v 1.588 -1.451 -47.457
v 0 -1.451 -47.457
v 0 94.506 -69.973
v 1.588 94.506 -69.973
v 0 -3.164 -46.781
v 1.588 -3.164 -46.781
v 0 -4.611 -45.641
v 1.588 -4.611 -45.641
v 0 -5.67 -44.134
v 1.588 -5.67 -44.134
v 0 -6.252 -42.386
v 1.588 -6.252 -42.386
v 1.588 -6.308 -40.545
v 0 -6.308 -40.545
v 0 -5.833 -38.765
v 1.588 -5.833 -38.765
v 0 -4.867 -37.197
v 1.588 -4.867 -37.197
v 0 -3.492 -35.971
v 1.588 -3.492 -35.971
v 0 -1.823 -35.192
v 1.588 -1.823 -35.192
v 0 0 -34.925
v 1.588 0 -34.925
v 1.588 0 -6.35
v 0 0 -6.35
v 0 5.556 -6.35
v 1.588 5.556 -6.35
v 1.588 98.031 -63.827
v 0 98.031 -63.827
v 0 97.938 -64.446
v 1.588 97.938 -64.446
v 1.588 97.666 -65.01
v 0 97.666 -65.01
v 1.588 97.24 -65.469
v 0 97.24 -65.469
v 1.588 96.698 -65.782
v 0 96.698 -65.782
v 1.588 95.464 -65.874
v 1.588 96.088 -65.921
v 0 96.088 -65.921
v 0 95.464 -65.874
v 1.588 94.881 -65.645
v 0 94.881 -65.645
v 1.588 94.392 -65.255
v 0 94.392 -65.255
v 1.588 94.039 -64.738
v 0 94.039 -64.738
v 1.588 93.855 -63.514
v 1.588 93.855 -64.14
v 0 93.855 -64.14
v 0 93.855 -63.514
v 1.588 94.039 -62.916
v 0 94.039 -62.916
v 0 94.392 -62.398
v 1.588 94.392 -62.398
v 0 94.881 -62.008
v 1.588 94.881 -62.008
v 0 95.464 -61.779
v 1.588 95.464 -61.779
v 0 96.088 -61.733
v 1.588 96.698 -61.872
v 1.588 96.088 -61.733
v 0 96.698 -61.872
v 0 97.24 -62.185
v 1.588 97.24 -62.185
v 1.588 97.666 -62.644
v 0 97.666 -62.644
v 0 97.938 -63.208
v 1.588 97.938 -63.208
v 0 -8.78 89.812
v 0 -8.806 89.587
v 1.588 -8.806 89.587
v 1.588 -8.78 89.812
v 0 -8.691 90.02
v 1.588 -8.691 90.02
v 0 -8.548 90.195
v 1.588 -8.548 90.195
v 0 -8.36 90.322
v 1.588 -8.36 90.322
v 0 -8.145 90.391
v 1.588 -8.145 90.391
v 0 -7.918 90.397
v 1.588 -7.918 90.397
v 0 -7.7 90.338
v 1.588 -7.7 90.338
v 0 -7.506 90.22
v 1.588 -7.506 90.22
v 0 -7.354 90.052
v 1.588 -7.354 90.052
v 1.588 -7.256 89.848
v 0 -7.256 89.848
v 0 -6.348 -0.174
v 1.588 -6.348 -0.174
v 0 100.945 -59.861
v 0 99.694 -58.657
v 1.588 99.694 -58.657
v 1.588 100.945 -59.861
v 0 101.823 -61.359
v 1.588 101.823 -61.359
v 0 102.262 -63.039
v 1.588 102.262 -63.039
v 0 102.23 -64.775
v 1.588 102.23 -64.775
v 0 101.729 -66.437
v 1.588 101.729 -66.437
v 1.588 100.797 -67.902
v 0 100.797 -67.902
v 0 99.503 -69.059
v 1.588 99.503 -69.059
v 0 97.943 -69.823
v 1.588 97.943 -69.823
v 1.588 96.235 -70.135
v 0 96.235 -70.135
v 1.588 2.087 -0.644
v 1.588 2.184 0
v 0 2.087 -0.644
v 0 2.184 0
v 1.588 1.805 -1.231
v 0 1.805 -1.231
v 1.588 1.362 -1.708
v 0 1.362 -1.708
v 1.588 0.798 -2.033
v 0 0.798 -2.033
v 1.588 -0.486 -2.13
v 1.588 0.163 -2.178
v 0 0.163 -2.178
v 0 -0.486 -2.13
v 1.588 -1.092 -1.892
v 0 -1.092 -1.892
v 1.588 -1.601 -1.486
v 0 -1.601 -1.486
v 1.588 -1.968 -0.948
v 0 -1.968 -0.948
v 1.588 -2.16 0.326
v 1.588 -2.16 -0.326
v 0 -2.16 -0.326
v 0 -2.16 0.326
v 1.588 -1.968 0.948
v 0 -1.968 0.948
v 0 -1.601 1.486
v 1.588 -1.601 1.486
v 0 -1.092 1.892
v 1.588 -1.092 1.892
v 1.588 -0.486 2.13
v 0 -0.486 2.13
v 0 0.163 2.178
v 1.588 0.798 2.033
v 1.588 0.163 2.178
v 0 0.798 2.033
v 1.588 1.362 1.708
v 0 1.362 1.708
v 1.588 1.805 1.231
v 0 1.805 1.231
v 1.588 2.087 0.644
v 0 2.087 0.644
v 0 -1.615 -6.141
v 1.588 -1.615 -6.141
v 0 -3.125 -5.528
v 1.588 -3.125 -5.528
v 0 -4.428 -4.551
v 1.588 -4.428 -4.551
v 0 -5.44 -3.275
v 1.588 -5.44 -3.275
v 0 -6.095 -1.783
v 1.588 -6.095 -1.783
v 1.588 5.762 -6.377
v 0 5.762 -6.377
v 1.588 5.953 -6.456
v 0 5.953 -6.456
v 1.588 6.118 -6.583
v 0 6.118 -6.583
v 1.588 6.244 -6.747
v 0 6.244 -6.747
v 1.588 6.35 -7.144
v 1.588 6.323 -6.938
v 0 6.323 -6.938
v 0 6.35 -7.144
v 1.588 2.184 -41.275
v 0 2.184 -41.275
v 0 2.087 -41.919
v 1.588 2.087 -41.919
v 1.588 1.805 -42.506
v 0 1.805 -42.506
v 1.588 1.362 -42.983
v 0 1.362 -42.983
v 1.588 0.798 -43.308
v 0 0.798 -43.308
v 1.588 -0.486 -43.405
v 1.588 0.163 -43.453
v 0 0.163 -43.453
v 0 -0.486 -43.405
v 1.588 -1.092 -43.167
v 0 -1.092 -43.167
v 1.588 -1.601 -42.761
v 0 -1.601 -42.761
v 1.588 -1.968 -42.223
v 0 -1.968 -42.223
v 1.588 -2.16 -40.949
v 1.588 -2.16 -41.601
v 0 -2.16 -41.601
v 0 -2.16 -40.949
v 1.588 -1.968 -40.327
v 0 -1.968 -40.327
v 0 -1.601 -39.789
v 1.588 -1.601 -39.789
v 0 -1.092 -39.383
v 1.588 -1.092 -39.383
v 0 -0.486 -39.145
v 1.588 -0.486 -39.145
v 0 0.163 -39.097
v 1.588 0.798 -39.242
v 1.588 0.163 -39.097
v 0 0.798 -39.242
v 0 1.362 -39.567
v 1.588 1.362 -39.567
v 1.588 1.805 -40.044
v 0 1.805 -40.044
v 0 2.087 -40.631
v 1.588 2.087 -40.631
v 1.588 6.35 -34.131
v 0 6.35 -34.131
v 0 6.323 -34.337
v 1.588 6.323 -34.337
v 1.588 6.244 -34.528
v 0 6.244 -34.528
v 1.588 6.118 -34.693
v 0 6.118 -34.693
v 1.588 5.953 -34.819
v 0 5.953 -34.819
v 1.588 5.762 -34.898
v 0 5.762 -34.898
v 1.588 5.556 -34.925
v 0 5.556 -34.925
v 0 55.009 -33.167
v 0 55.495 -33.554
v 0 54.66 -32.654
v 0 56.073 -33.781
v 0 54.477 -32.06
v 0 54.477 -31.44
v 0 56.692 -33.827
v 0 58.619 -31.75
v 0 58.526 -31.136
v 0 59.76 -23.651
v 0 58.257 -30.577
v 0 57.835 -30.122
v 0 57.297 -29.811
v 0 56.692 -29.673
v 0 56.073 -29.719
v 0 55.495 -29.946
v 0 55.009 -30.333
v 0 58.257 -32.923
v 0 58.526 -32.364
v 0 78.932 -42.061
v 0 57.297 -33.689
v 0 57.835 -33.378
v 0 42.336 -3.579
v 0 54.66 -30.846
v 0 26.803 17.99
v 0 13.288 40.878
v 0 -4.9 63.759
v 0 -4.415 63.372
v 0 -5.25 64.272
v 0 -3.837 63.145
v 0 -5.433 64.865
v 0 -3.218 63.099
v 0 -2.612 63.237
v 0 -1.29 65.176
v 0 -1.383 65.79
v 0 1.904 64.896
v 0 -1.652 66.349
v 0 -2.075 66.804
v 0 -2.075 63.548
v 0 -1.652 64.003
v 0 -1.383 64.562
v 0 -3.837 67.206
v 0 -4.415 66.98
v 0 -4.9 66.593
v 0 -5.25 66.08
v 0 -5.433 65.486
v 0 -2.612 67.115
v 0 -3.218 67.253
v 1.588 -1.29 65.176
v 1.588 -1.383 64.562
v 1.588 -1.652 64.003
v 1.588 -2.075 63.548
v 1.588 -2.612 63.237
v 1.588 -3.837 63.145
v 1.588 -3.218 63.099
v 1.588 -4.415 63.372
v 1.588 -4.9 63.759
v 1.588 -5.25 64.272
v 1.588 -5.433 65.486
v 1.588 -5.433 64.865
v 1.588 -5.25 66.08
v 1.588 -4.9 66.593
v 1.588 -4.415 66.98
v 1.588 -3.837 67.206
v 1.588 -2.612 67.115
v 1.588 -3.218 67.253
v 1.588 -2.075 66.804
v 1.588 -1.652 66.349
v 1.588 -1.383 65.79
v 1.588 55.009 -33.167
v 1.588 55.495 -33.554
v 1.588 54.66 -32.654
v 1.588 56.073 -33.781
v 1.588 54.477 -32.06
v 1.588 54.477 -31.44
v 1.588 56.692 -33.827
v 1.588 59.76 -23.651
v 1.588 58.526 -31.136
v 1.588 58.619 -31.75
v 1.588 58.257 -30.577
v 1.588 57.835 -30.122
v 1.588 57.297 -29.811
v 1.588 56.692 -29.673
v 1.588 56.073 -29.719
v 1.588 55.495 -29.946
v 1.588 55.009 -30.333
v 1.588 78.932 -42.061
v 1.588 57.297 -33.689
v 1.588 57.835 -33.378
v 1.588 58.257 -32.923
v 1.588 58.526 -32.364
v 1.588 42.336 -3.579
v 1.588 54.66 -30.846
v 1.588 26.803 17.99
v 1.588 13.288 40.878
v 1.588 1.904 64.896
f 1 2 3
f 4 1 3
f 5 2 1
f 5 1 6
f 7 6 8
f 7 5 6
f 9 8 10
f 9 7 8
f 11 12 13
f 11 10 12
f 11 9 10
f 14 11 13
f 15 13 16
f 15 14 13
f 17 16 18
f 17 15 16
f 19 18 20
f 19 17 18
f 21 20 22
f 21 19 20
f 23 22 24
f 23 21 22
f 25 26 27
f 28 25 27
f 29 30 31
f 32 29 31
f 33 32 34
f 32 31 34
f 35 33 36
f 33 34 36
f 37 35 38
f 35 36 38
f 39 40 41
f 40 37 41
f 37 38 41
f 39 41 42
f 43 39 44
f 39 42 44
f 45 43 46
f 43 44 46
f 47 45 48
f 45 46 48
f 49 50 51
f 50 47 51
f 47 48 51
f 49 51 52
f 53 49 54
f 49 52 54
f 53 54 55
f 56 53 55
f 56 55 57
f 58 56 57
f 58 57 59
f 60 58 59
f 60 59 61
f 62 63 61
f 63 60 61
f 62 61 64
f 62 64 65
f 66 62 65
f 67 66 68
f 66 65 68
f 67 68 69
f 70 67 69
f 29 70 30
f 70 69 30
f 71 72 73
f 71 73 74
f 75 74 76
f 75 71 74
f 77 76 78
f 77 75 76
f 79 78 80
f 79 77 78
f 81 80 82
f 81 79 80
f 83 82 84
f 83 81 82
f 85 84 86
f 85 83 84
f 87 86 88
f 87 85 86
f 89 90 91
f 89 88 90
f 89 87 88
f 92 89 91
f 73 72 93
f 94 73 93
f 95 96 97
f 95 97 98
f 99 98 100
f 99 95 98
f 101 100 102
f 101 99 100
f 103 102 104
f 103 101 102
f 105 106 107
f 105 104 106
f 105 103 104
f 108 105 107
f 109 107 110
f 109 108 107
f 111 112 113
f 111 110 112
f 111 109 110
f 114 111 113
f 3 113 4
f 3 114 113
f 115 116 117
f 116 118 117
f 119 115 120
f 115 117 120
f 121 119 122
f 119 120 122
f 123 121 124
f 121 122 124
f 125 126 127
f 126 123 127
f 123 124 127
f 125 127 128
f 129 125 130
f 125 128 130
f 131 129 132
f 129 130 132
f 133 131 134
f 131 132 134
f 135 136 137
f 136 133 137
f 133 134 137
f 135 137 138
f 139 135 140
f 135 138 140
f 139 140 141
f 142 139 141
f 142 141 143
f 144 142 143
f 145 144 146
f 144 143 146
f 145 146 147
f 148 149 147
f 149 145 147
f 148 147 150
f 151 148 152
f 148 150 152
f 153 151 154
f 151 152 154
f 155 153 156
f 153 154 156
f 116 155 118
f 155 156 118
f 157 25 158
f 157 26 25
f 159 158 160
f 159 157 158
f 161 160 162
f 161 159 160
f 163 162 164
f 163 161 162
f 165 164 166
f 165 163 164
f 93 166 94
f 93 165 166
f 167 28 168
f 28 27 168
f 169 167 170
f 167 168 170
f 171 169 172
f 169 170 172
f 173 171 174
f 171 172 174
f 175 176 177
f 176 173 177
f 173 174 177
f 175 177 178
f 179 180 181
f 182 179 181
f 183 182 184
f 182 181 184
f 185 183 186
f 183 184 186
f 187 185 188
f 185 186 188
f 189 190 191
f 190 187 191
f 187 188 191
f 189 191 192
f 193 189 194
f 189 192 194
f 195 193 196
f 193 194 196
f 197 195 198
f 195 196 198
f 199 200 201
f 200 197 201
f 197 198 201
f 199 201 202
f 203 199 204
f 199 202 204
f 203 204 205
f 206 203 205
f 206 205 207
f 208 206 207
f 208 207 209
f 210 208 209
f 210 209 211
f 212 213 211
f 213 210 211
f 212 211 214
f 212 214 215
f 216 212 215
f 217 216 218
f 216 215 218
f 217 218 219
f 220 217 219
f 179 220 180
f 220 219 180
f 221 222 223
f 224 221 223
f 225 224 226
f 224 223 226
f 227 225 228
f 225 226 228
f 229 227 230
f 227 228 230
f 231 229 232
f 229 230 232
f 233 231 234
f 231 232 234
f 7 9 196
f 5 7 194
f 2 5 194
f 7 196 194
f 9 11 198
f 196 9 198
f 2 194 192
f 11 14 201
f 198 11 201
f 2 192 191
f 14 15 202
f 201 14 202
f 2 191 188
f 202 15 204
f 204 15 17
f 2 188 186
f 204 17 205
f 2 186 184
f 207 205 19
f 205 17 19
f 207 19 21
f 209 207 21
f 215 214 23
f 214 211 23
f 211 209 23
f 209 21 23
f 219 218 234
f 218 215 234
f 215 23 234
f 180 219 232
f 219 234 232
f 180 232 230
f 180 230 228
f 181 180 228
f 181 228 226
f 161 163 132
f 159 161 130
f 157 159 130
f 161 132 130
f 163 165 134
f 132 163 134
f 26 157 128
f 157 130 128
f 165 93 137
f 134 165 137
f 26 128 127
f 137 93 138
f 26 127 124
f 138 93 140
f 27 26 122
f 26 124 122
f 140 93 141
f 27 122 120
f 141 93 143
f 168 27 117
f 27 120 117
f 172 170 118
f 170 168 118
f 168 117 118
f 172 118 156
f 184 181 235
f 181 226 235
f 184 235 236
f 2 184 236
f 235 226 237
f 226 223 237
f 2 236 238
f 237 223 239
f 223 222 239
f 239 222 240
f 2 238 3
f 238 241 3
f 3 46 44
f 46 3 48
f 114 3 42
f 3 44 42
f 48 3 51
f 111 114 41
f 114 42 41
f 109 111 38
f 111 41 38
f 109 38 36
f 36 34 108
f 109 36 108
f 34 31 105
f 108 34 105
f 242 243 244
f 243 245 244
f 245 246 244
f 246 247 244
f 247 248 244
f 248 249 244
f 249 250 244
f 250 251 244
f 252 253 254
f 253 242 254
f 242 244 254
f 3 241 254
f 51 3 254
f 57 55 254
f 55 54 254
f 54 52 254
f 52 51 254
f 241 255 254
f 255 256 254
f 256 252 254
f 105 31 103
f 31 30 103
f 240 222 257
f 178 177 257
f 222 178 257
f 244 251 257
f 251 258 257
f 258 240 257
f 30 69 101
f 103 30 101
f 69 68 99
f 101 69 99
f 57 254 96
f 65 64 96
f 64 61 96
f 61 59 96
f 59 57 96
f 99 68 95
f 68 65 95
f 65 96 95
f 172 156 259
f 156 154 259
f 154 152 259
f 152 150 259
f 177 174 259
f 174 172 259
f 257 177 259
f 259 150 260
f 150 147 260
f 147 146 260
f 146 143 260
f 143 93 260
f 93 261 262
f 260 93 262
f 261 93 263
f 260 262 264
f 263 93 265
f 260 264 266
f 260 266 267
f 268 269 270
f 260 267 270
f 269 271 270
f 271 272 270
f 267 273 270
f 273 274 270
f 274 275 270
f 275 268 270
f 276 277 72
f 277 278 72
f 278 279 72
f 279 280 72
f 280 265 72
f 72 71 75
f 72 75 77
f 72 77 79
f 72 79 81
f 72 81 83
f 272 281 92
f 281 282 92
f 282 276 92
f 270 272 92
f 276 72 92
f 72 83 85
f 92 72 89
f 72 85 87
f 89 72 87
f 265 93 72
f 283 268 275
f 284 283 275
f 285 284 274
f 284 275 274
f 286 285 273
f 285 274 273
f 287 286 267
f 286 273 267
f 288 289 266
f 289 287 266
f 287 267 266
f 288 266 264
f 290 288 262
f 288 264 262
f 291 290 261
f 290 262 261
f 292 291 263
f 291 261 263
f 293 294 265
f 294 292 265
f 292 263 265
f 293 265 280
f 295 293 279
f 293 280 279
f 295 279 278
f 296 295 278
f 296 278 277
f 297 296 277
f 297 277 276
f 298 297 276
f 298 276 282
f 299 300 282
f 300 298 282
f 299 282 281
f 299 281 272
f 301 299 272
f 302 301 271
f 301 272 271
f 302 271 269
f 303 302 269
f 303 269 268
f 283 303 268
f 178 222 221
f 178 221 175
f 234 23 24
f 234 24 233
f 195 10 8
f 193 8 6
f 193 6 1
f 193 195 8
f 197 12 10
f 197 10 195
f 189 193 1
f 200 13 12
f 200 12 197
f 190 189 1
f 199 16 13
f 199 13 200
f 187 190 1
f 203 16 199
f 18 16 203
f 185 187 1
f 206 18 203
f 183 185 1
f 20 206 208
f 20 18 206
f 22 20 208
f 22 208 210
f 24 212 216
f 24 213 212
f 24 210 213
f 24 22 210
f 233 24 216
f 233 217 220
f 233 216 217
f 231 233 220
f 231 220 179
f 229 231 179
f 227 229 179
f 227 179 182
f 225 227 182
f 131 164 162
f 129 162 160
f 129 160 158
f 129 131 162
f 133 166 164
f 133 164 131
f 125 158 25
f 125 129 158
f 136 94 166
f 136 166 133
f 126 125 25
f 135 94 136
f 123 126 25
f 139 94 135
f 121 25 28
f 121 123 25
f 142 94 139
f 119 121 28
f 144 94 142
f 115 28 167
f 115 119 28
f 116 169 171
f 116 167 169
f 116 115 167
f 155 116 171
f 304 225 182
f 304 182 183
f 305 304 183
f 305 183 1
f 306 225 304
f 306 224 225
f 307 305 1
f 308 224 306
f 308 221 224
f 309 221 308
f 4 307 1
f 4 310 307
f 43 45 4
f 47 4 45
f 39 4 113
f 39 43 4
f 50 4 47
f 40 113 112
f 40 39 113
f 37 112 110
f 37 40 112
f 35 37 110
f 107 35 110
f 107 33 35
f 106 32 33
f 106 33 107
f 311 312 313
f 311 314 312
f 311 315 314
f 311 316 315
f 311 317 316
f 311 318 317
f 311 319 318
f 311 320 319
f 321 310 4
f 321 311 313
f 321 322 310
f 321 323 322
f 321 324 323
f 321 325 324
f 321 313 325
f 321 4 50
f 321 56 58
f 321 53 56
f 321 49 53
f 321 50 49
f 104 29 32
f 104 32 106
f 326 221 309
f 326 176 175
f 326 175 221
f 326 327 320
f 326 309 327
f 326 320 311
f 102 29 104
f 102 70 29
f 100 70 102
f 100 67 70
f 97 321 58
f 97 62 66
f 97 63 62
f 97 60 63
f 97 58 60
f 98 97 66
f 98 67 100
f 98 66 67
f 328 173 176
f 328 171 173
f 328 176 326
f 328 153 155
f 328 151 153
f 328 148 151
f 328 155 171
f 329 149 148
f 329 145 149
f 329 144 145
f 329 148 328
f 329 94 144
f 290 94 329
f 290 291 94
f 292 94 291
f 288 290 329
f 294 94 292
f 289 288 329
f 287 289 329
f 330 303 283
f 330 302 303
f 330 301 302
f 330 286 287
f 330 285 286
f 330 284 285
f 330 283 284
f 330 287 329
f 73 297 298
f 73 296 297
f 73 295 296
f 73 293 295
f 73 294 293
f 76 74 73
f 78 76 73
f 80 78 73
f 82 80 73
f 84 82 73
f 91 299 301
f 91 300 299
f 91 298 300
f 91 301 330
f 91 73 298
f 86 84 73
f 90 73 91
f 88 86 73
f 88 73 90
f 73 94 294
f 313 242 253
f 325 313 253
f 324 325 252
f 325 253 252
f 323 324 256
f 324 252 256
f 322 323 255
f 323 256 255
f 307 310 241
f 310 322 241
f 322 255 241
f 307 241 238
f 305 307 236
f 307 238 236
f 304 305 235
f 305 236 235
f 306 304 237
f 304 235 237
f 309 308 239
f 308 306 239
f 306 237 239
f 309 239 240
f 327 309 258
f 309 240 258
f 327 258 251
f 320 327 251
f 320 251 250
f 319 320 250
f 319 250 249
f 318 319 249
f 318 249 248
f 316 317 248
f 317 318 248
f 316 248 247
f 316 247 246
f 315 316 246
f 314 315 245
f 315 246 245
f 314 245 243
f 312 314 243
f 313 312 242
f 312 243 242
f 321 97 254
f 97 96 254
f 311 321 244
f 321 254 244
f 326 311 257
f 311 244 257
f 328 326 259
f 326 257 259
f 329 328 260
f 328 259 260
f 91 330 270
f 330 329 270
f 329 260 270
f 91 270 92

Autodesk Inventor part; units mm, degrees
ref_plane "YZ Plane" through (0, 0, 0) normal (1, 0, 0) x (0, 1, 0)
ref_plane "XZ Plane" through (0, 0, 0) normal (0, 1, 0) x (-1, 0, 0)
ref_plane "XY Plane" through (0, 0, 0) normal (0, 0, 1) x (1, 0, 0)
sketch "main" plane through (0, 0, 0) normal (0, 0, 1) x (1, 0, 0)
  circle A0 centre (-191.7635, 49.9495) radius 2.1844
  circle A1 centre (-95.8324, -13.8772) radius 2.1
  arc A2 (-99.5462, -18.9735) -> (-92.0695, -8.7075) centre (-95.8064, -13.8415) ccw
  arc A3 (-198.1111, 49.7757) -> (-191.7635, 43.5995) centre (-191.7635, 49.9495) ccw
  line L0 (-200.5697, 139.5363) -> (-198.1111, 49.7757)
  arc A4 (-199.0195, 139.7975) -> (-92.0695, -8.7075) centre (80.274, 228.1743) ccw
  circle A5 centre (-195.1368, 115.1254) radius 2.0828
  line L1 (-191.7635, 43.5995) -> (-186.2072, 43.5995)
  arc A6 (-199.0195, 139.7975) -> (-200.5697, 139.5363) centre (-199.7762, 139.5581) ccw
  circle A7 centre (-135.2274, 18.1995) radius 2.0828
  circle A8 centre (-191.7635, 8.6745) radius 2.1844
  arc A9 (-191.7635, 15.0245) -> (-193.2141, 2.4924) centre (-191.7635, 8.6745) ccw
  line L2 (-185.4135, 15.8183) -> (-185.4135, 42.8058)
  line L3 (-191.7635, 15.0245) -> (-186.2072, 15.0245)
  arc A10 (-185.4135, 42.8058) -> (-186.2072, 43.5995) centre (-186.2072, 42.8058) ccw
  arc A11 (-186.2072, 15.0245) -> (-185.4135, 15.8183) centre (-186.2072, 15.8183) ccw
  line L4 (-193.2141, 2.4924) -> (-97.2571, -20.0236)
  point P0 (1.1251, 9.7944)
  point P1 (-200.7302, 145.398)
  dimension "d7" = 12.7
  dimension "d8" = 4.1656
  dimension "d9" = 6.35
  dimension "d11" = 0.7937
  dimension "d13" = 4.1656
  dimension "d15" = 12.7
  dimension "d16" = 0.7937
sketch "Sketch1" plane through (0, 0, 0) normal (1, 0, 0) x (0, 1, 0)
  circle A0 centre (0, 0) radius 2.1844
  circle A1 centre (95.9311, -63.8268) radius 2.1
  arc A2 (92.2173, -68.923) -> (99.694, -58.6571) centre (95.9571, -63.7911) ccw
  arc A3 (-6.3476, -0.1739) -> (0, -6.35) centre (0, 0) ccw
  line L0 (-8.8062, 89.5868) -> (-6.3476, -0.1739)
  arc A4 (-7.256, 89.848) -> (99.694, -58.6571) centre (272.0375, 178.2247) ccw
  circle A5 centre (-3.3733, 65.1759) radius 2.0828
  line L1 (0, -6.35) -> (5.5563, -6.35)
  arc A6 (-7.256, 89.848) -> (-8.8062, 89.5868) centre (-8.0127, 89.6085) ccw
  circle A7 centre (56.5361, -31.75) radius 2.0828
  circle A8 centre (0, -41.275) radius 2.1844
  arc A9 (0, -34.925) -> (-1.4506, -47.4571) centre (0, -41.275) ccw
  line L2 (6.35, -34.1313) -> (6.35, -7.1438)
  line L3 (0, -34.925) -> (5.5563, -34.925)
  arc A10 (6.35, -7.1438) -> (5.5563, -6.35) centre (5.5563, -7.1437) ccw
  arc A11 (5.5563, -34.925) -> (6.35, -34.1313) centre (5.5563, -34.1313) ccw
  line L4 (-1.4506, -47.4571) -> (94.5064, -69.9732)
extrude "Extrusion1" add sketch "Sketch1" along normal blind 1.5875
properties part number "ramp"
